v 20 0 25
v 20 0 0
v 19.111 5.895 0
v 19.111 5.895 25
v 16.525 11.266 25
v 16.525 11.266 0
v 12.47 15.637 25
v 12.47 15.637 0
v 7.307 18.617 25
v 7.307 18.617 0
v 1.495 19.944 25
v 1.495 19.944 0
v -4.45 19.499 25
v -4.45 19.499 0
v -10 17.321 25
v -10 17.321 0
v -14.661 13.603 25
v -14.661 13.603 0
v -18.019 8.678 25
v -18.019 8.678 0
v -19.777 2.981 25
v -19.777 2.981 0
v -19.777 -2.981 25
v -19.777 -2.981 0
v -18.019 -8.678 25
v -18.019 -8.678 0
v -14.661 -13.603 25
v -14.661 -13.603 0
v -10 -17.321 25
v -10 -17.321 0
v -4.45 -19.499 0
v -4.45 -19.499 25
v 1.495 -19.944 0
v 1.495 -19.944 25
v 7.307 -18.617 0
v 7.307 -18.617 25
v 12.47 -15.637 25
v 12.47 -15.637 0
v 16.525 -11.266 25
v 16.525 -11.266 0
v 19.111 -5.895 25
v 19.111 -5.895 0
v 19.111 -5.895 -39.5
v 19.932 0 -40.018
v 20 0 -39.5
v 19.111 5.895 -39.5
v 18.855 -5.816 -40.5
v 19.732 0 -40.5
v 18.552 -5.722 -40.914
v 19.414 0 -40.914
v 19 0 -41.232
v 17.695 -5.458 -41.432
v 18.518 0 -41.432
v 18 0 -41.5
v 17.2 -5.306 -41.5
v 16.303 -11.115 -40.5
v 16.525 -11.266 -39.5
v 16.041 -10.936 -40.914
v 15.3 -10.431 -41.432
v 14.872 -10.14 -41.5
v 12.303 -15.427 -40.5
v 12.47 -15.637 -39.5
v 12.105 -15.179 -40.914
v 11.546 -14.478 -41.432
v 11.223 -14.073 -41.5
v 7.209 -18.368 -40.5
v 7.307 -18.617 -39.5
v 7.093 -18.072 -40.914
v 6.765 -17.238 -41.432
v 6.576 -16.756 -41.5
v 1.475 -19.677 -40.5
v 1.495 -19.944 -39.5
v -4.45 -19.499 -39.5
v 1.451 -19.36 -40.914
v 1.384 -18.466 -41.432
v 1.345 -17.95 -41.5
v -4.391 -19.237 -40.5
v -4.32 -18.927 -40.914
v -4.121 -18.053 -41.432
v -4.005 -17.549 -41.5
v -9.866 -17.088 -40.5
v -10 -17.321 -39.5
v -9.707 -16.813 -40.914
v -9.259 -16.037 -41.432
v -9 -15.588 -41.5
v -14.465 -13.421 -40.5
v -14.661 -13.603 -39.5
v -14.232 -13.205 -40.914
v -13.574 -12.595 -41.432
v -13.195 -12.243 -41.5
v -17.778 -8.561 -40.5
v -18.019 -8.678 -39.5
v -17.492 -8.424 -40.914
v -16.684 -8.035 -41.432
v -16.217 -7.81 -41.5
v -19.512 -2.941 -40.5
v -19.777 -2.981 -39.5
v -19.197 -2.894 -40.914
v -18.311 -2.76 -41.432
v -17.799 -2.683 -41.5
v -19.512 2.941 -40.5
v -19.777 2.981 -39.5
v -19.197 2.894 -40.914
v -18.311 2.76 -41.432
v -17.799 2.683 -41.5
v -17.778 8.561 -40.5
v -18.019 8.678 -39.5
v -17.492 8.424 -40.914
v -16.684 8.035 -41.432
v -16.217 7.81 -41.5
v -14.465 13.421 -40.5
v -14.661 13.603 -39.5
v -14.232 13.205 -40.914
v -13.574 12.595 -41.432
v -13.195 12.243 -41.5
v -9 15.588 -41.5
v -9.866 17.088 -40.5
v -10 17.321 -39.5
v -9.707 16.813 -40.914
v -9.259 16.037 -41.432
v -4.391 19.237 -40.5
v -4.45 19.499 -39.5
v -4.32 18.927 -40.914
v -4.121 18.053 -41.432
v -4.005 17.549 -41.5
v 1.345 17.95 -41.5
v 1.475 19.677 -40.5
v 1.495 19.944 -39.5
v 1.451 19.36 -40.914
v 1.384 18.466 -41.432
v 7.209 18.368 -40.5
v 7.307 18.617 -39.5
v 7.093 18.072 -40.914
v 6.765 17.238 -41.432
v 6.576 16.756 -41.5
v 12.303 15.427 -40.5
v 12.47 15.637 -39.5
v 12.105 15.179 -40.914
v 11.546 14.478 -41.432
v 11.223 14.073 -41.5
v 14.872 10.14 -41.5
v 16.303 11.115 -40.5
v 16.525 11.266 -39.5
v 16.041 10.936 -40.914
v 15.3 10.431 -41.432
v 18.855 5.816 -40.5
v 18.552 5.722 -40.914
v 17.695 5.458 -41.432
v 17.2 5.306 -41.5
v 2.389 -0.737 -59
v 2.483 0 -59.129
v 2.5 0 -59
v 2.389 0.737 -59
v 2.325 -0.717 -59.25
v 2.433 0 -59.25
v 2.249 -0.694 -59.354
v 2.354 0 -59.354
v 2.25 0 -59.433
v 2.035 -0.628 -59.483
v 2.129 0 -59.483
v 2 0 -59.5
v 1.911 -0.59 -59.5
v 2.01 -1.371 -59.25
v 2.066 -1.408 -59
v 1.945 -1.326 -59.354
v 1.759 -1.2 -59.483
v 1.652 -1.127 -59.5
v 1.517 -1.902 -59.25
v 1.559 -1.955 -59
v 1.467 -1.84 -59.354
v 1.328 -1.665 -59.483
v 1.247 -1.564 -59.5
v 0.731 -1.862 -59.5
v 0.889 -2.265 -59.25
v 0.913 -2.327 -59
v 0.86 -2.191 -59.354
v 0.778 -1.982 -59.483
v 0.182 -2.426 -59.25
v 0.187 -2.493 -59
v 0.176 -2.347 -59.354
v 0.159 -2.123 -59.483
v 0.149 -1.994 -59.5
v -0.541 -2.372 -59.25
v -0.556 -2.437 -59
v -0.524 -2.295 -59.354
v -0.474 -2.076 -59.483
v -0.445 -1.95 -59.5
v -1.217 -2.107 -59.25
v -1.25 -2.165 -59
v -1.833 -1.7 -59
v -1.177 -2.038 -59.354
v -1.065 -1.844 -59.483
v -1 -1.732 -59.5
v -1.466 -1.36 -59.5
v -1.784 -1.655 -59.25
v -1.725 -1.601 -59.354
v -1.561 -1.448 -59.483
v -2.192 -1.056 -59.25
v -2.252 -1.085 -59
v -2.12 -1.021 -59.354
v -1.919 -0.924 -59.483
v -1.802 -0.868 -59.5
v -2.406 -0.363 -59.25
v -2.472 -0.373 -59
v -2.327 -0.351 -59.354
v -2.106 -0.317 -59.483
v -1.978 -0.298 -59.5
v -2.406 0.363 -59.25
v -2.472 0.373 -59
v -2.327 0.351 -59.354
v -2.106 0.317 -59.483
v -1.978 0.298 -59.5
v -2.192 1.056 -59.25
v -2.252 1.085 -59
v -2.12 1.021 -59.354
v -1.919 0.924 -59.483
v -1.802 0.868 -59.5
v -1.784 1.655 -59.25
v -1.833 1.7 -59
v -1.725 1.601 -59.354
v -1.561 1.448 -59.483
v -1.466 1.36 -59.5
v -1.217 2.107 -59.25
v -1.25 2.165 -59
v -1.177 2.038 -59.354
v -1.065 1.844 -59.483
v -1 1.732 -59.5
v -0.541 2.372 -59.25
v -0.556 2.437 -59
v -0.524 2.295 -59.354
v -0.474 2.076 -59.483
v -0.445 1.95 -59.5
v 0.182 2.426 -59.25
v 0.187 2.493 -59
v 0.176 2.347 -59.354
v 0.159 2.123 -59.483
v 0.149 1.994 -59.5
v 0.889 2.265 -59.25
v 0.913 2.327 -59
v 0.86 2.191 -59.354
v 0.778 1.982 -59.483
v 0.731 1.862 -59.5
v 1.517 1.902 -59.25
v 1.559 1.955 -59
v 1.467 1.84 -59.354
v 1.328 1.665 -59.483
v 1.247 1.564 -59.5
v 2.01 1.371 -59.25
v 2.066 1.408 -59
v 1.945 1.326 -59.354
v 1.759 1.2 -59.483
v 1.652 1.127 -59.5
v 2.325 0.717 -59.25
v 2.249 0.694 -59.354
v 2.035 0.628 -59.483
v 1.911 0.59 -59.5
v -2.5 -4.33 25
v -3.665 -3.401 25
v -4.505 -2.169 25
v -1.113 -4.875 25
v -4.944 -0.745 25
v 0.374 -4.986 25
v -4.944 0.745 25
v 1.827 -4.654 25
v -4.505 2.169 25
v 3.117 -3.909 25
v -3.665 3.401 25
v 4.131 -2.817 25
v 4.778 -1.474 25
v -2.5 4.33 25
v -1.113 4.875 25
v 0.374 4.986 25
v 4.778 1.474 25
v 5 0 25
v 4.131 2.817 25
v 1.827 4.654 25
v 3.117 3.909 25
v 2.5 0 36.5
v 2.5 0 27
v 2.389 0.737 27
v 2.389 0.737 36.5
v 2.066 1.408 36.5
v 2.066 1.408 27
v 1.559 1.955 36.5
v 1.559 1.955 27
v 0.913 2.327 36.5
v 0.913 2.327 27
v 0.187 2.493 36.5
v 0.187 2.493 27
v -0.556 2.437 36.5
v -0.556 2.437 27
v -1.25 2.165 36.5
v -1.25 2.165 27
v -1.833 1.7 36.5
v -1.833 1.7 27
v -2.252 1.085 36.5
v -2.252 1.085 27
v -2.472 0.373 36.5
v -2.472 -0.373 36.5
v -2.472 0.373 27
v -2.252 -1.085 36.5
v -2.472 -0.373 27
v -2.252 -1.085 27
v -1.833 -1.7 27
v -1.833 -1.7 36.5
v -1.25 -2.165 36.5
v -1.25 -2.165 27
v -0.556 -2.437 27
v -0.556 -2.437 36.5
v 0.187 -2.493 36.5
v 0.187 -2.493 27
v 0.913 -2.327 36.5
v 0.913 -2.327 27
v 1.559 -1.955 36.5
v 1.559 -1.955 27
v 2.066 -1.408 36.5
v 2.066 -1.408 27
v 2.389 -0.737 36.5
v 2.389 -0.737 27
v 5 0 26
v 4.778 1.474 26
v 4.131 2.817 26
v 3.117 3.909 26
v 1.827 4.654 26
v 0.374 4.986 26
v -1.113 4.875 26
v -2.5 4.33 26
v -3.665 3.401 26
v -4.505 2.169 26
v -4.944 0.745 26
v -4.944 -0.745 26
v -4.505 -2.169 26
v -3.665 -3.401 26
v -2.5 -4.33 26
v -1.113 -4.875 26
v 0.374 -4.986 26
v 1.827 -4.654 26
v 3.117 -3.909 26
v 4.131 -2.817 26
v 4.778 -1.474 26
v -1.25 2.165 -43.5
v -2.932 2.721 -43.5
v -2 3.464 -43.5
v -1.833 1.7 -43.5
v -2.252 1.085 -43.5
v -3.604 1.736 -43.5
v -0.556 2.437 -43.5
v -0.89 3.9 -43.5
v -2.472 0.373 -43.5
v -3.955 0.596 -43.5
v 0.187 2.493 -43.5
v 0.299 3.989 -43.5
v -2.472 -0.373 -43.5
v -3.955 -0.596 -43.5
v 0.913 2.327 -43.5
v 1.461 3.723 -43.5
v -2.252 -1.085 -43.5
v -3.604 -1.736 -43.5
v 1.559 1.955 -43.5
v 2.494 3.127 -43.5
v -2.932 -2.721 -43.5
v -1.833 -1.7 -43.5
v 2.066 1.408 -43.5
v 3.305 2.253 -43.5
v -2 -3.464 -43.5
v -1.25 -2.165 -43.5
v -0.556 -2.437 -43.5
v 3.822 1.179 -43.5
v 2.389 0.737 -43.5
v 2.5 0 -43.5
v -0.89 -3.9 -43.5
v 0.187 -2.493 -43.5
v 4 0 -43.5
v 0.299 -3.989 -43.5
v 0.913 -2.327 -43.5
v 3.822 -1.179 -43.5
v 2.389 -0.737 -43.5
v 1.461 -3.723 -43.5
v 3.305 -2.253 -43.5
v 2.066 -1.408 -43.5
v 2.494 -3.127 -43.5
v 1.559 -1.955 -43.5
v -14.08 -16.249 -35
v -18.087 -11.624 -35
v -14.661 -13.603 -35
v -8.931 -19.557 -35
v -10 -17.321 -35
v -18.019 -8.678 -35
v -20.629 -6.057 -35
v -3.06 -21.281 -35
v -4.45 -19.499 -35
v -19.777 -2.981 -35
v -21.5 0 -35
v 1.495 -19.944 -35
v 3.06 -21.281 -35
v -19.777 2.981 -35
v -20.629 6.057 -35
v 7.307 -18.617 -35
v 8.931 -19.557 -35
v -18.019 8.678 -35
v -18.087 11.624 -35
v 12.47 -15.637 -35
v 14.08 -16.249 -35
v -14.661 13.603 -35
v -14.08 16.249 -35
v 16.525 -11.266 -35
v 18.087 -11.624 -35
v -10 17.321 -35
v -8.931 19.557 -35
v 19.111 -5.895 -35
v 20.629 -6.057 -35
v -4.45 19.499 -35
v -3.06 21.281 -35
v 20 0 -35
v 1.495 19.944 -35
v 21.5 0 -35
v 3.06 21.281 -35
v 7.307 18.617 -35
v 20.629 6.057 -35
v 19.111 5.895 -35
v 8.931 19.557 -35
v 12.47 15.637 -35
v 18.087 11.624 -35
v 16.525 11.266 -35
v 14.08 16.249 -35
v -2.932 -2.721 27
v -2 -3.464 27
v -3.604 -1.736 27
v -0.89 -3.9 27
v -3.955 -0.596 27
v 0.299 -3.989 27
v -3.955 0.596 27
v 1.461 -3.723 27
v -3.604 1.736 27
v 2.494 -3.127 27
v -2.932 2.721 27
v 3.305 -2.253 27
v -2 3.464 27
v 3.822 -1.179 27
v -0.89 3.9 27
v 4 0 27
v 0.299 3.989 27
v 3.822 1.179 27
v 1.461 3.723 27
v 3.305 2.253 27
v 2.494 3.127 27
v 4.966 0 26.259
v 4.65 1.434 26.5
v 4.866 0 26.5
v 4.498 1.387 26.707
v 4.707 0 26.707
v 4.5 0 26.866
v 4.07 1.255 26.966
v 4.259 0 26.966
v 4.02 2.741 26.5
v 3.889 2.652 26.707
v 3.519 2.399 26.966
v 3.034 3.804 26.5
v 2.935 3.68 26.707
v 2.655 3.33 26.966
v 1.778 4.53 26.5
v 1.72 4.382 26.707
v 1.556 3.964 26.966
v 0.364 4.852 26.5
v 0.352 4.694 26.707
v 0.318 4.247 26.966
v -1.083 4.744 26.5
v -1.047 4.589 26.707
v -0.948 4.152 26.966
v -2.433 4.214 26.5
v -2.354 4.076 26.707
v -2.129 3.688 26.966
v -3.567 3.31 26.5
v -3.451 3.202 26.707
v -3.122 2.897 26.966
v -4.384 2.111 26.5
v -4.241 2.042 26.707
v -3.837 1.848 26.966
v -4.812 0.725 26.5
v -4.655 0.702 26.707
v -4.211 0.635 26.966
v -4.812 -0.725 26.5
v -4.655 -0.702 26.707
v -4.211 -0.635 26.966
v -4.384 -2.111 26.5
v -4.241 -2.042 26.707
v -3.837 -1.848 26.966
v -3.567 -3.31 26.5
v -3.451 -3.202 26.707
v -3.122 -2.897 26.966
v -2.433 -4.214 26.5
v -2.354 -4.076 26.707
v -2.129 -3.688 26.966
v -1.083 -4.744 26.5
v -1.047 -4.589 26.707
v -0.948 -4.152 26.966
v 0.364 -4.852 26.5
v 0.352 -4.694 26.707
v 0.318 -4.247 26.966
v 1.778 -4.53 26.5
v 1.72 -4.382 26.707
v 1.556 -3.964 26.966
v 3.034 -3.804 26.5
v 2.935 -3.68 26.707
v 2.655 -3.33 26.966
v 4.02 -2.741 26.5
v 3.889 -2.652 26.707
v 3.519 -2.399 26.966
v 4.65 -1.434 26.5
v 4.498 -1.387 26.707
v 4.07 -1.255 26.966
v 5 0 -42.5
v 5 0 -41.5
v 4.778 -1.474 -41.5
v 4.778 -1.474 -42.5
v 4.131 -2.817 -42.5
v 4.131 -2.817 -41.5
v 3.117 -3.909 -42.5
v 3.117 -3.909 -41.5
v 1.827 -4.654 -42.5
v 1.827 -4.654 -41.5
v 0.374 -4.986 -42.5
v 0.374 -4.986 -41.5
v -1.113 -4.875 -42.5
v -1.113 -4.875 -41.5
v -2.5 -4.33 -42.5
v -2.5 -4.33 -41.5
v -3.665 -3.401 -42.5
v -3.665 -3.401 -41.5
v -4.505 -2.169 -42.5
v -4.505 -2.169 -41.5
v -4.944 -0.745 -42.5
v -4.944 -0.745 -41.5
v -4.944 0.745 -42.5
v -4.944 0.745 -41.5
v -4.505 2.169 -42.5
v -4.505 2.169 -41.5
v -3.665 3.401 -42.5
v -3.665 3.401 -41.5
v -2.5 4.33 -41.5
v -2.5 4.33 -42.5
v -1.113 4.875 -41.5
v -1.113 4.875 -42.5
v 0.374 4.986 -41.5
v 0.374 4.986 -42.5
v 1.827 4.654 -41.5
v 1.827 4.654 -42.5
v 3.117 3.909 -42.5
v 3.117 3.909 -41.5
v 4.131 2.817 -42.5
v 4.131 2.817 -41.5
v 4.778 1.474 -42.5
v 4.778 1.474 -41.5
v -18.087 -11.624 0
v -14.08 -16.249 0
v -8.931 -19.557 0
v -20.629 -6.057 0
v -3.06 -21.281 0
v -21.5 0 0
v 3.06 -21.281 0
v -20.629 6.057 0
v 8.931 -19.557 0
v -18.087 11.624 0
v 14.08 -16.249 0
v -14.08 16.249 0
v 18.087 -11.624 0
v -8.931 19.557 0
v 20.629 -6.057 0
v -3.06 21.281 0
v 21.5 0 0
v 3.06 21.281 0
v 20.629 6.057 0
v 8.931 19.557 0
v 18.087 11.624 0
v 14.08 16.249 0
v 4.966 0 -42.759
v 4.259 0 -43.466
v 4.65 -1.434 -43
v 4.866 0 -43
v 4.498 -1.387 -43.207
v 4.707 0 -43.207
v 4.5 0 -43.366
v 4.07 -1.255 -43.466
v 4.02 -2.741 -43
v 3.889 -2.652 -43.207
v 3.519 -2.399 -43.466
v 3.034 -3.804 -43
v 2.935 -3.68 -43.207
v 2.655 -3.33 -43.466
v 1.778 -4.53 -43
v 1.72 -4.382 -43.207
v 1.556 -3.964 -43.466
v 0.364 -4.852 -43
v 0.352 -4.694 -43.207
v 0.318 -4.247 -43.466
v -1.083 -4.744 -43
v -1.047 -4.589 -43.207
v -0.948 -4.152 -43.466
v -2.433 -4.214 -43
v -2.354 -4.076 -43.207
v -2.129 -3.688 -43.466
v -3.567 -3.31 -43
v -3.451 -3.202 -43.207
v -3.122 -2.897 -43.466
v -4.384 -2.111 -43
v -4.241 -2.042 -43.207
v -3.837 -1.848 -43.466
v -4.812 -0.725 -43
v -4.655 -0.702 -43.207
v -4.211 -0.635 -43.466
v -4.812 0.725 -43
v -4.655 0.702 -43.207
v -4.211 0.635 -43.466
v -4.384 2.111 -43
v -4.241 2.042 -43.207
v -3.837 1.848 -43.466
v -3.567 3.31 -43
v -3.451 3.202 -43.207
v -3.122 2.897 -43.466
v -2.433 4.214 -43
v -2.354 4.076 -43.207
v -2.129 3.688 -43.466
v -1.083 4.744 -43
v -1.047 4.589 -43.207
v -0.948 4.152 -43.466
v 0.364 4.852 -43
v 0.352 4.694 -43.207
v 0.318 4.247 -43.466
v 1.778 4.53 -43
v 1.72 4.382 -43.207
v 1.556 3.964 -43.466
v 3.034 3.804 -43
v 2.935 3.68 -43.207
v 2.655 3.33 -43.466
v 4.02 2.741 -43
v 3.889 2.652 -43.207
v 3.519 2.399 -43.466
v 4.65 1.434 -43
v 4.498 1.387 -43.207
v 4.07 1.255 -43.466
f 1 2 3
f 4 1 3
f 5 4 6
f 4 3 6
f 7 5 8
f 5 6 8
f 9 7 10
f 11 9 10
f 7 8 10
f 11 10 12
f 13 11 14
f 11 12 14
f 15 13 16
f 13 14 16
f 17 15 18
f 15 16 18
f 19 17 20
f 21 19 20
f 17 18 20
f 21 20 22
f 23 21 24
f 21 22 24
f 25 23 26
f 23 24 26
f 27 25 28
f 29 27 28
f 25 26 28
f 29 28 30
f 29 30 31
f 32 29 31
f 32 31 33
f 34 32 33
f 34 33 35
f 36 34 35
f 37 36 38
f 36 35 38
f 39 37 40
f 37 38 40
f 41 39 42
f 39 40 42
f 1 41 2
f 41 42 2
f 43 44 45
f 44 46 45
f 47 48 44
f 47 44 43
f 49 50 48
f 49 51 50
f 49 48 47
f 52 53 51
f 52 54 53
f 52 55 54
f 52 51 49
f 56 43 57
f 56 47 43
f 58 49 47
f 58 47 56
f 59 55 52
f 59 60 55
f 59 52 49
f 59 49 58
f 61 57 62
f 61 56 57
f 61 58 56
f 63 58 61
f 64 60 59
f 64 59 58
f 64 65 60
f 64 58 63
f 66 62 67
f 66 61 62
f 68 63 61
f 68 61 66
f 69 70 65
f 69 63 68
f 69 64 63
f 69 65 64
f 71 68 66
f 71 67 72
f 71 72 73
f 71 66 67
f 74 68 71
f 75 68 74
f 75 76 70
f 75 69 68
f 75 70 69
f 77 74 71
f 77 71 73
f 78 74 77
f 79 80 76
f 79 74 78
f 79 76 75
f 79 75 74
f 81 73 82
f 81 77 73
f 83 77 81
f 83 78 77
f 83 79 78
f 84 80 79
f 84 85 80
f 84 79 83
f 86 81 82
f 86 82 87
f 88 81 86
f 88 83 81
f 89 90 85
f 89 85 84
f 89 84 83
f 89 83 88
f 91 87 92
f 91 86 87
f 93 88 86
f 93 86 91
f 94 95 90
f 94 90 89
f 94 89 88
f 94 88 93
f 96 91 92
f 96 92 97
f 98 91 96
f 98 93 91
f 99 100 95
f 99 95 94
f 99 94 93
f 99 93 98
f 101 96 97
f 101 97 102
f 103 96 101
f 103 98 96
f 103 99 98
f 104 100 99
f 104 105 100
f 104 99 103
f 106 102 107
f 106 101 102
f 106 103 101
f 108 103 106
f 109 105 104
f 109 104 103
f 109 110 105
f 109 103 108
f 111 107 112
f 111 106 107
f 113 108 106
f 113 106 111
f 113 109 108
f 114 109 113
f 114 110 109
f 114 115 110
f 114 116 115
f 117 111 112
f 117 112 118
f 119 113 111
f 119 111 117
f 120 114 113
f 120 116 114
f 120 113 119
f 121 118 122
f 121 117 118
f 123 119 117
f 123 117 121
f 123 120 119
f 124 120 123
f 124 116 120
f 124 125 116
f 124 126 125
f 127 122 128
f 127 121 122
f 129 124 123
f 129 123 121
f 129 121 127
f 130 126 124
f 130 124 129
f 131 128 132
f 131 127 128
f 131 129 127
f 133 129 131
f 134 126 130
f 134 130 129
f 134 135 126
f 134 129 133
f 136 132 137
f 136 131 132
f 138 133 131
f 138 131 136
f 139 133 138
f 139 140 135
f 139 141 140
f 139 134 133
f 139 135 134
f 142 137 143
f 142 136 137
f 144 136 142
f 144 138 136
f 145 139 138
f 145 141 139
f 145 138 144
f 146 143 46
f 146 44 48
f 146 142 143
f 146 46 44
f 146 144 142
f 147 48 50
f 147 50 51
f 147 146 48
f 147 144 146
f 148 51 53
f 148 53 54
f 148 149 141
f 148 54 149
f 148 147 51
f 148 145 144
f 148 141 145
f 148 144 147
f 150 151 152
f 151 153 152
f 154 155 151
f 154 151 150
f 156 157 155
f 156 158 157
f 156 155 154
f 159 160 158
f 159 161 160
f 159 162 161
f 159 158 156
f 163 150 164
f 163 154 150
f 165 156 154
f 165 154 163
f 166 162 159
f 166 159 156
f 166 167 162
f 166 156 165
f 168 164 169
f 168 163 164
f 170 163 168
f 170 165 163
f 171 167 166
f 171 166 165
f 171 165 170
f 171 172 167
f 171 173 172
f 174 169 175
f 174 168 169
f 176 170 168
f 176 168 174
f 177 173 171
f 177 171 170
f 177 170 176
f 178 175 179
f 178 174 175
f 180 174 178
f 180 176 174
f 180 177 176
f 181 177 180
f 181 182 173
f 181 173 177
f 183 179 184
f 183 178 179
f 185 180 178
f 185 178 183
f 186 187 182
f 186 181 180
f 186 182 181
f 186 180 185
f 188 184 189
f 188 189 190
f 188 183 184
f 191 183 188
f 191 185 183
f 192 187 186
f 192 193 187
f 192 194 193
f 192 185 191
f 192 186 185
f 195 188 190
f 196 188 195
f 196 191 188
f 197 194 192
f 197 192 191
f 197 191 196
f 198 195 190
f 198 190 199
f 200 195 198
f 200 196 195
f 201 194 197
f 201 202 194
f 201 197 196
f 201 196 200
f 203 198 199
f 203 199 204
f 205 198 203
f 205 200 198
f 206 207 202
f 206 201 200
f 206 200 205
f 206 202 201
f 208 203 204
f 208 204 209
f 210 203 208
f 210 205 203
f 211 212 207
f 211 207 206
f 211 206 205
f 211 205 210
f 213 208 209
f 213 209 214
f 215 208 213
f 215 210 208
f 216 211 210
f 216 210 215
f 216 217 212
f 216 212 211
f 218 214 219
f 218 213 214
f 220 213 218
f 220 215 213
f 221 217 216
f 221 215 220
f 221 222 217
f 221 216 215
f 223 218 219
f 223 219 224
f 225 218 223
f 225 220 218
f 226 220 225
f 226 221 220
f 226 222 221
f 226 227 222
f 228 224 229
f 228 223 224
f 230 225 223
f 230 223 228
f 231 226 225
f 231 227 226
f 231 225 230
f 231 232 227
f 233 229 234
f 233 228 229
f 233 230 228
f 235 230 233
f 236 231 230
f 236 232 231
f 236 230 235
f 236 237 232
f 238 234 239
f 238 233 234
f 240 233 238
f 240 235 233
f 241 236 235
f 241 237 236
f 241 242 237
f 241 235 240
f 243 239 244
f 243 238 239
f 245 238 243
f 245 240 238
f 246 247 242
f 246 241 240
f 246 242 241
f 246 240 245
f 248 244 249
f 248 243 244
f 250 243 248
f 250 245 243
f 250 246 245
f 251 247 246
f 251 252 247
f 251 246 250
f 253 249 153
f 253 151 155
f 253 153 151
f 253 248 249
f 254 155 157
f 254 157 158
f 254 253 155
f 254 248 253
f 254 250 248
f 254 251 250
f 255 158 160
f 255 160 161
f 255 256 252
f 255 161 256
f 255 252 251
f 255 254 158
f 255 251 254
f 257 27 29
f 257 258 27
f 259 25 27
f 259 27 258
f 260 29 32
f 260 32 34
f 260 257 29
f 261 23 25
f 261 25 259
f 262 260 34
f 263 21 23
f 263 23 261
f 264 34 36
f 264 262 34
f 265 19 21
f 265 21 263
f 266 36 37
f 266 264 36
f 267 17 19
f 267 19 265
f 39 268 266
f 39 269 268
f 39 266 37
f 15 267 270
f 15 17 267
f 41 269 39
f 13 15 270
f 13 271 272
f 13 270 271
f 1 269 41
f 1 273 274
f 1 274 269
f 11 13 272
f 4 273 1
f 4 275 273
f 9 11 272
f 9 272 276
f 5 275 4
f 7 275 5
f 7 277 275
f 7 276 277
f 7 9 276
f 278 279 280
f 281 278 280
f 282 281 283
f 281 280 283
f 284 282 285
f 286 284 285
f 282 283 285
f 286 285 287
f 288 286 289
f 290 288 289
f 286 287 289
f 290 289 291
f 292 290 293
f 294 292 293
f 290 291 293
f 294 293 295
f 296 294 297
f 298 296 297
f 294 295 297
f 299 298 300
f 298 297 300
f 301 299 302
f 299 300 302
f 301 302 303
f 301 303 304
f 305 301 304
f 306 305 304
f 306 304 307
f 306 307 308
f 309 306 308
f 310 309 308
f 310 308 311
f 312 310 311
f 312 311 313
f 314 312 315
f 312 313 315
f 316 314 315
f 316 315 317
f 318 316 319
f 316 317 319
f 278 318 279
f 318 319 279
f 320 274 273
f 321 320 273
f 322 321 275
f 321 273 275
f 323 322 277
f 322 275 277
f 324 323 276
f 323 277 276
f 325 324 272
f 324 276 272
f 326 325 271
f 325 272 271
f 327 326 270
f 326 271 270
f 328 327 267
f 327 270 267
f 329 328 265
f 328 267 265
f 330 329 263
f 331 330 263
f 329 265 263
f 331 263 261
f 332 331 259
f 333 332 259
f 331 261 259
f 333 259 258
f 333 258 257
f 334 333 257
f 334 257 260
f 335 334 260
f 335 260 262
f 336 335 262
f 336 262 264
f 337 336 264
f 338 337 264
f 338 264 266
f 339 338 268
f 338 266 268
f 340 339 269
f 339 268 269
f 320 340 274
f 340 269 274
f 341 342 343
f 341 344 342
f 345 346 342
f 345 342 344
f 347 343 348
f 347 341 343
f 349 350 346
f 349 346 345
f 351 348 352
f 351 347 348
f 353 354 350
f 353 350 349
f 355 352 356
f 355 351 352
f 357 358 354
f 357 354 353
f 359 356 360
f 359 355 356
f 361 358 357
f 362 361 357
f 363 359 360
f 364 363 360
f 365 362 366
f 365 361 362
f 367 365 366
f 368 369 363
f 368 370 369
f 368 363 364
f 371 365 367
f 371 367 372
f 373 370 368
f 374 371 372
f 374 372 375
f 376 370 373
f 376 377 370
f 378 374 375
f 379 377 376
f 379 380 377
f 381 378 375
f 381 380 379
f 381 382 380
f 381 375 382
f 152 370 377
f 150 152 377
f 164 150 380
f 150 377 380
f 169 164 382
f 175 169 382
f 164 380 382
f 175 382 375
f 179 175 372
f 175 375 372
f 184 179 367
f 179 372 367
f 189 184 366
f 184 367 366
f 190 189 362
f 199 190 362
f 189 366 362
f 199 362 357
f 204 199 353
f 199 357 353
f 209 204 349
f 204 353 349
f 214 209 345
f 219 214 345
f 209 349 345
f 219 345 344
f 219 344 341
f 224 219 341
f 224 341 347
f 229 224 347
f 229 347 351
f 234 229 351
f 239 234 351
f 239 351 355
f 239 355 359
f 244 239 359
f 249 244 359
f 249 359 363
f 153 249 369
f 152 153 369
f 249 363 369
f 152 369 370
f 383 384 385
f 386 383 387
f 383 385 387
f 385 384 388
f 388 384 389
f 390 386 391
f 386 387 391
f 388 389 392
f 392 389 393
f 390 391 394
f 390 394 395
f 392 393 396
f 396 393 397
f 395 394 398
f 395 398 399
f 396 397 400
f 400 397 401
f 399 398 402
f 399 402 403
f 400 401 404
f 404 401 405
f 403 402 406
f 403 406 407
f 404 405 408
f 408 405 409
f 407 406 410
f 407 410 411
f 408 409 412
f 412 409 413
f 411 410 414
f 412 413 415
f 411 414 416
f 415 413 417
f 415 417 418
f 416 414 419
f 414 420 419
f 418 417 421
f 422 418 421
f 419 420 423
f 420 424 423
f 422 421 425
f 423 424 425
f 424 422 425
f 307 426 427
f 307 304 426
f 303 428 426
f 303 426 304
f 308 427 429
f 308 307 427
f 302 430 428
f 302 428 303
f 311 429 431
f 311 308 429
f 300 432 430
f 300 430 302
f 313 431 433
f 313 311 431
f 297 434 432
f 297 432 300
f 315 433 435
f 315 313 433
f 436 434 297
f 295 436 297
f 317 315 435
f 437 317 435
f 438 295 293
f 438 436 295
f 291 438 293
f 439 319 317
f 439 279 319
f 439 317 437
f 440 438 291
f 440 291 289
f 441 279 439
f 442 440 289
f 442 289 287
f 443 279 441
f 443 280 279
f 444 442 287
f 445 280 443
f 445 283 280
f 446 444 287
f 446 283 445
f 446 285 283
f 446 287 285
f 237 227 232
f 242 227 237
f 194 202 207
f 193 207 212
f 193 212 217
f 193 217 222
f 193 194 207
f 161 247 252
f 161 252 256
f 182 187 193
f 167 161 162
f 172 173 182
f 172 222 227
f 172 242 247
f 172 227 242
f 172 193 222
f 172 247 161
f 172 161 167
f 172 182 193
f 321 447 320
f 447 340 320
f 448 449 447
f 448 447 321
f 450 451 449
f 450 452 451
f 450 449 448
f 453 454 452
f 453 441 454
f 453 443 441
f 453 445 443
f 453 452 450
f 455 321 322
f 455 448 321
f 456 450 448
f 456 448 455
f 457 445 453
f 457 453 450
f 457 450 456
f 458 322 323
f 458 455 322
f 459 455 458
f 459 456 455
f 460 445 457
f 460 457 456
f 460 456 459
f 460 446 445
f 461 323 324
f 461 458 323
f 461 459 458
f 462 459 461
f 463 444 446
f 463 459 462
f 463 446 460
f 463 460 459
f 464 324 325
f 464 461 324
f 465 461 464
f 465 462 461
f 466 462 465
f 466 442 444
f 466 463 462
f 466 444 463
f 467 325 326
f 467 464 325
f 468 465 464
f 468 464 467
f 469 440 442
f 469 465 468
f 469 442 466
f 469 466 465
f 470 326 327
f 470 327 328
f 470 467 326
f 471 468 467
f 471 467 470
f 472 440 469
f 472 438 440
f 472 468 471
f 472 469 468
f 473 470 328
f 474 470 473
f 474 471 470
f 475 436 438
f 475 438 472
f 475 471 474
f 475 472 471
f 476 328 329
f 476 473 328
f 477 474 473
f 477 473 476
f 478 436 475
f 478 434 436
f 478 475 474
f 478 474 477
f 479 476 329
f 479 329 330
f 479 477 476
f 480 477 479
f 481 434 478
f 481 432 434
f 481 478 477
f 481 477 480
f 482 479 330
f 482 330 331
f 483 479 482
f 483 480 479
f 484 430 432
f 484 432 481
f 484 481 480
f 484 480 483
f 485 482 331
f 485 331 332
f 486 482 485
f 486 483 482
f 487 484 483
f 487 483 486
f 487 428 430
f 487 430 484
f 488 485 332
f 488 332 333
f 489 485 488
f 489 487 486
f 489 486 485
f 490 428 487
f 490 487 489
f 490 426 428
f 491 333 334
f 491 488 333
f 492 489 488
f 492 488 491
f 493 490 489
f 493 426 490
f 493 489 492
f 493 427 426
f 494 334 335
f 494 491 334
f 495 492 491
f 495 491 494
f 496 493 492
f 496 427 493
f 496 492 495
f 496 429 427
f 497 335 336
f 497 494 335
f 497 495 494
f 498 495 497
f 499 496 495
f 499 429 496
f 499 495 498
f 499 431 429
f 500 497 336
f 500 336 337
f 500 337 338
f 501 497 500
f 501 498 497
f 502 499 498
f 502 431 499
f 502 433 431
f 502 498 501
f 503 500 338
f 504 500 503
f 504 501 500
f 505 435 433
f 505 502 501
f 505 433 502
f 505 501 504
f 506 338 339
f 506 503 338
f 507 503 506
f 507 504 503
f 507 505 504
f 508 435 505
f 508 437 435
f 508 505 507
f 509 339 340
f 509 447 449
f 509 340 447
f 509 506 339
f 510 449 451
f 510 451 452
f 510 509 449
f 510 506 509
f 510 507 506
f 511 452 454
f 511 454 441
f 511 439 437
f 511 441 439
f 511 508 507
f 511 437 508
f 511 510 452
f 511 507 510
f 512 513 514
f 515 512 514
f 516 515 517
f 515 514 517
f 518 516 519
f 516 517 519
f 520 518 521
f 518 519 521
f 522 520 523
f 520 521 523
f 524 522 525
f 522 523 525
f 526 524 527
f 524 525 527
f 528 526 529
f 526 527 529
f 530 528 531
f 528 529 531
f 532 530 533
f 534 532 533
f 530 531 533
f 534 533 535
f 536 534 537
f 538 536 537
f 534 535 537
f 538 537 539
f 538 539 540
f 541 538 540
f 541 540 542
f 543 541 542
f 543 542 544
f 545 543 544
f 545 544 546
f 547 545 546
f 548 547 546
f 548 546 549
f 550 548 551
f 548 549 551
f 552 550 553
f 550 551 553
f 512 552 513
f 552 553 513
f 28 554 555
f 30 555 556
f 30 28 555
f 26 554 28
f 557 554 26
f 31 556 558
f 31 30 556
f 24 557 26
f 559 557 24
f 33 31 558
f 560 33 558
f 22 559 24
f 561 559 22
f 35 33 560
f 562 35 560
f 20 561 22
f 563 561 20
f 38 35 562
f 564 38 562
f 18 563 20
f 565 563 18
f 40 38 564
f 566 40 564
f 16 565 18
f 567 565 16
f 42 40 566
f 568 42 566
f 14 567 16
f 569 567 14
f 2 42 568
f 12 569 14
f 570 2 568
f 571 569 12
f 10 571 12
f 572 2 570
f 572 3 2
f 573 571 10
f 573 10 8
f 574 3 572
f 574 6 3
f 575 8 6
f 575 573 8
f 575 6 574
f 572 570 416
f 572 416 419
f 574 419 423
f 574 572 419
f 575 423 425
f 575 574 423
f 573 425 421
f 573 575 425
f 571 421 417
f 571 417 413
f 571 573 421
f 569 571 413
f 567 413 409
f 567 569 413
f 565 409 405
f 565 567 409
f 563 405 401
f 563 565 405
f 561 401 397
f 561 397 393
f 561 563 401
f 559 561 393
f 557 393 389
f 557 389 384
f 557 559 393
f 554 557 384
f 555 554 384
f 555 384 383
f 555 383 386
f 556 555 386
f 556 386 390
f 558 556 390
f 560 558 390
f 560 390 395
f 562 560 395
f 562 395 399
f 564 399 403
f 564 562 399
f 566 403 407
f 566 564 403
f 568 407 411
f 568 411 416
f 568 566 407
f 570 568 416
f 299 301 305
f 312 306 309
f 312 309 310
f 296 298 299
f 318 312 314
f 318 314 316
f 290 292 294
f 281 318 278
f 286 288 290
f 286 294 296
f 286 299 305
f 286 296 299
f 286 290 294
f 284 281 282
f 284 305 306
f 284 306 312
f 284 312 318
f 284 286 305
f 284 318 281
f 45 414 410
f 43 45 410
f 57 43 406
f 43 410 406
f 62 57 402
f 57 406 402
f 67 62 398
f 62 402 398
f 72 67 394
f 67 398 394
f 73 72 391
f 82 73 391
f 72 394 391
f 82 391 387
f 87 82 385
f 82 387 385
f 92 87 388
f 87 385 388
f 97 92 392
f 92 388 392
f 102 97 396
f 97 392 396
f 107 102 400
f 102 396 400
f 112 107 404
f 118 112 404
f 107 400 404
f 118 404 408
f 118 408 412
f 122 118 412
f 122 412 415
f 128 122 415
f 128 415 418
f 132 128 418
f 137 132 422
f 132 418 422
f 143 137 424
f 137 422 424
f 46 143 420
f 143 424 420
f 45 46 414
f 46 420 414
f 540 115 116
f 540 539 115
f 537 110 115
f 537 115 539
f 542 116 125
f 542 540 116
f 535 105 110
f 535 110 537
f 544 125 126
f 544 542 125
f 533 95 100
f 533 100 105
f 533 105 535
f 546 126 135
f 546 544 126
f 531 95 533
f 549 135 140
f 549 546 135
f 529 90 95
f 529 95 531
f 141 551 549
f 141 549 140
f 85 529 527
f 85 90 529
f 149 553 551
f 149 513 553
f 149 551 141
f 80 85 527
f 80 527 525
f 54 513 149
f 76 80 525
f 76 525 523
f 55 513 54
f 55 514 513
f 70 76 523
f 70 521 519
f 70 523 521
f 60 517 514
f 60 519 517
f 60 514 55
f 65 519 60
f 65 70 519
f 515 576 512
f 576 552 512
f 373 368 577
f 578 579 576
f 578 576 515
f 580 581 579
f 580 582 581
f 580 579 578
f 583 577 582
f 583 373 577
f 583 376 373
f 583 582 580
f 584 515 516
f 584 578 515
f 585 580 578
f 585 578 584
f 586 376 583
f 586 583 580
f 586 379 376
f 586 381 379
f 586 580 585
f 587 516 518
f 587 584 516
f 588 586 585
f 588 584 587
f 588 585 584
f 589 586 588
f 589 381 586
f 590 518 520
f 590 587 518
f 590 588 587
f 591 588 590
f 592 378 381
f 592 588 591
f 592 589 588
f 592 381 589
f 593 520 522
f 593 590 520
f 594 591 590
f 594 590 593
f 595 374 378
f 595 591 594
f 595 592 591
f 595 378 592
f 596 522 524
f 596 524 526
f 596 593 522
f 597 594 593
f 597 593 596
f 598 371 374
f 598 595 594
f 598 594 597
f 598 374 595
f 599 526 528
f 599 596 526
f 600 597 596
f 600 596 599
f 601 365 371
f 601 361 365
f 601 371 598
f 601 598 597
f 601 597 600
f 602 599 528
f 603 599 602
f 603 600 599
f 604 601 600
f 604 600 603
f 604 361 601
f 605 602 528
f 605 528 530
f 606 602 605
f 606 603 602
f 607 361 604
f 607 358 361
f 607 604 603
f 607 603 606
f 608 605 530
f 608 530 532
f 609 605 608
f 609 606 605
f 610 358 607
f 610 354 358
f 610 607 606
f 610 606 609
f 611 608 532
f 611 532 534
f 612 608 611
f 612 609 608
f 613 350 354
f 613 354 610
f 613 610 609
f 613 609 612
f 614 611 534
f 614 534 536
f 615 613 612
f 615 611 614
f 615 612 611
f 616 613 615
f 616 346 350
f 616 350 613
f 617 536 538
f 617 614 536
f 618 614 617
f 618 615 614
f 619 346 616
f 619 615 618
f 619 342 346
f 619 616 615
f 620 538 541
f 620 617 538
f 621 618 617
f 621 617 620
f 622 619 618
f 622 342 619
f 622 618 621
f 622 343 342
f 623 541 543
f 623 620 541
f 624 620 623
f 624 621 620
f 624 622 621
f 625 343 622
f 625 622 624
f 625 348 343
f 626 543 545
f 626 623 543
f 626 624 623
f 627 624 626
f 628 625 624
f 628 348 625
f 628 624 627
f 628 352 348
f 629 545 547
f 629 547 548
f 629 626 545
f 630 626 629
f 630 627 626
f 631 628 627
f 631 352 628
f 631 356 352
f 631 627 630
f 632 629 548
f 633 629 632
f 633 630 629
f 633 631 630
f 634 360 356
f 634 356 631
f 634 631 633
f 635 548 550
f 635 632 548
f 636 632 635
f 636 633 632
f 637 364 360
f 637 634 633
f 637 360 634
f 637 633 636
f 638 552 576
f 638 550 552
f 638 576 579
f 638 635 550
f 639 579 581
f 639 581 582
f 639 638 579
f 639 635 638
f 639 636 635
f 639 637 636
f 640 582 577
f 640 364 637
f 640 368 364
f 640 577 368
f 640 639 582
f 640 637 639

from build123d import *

# Parameters (mm, degrees)
F0_R      = 21.5
F1_DEPTH  = 35
F2_R      = 20
F3_DEPTH  = 25
F4_R      = 5
F5_DEPTH  = 2
F6_R      = 20
F7_DEPTH  = 6.5
F8_R      = 2
F9_R      = 5
F10_DEPTH = 2
F11_R     = 1
F12_R     = 2.5
F13_DEPTH = 16
F14_R     = 0.5
F15_R     = 1
F16_R     = 2.5
F17_DEPTH = 9.5


with BuildPart() as f1:
    # F0 (on Top) → F1 (new body)
    with BuildSketch(Plane.XY):
        Circle(F0_R)
    extrude(amount=-F1_DEPTH)

    # F2 (on face) → F3 (join)
    with BuildSketch(Plane.XY):
        Circle(F2_R)
    extrude(amount=F3_DEPTH)

    # F4 (on face) → F5 (join)
    with BuildSketch(Plane.XY.offset(25)):
        Circle(F4_R)
    extrude(amount=F5_DEPTH)

    # F6 (on face) → F7 (join)
    with BuildSketch(Plane(origin=(0, 0, -35), x_dir=(1, 0, 0), z_dir=(0, 0, -1))):
        Circle(F6_R)
    extrude(amount=F7_DEPTH)

    # F8
    f8_edges = [f1.edges().sort_by_distance(p)[0] for p in [
        (-20, 0, -41.5),
    ]]
    fillet(f8_edges, radius=F8_R)

    # F9 (on face) → F10 (join)
    with BuildSketch(Plane(origin=(0, 0, -41.5), x_dir=(1, 0, 0), z_dir=(0, 0, -1))):
        Circle(F9_R)
    extrude(amount=F10_DEPTH)

    # F11
    f11_edges = [f1.edges().sort_by_distance(p)[0] for p in [
        (-5, 0, -43.5),
    ]]
    fillet(f11_edges, radius=F11_R)

    # F12 (on face) → F13 (join)
    with BuildSketch(Plane(origin=(0, 0, -43.5), x_dir=(1, 0, 0), z_dir=(0, 0, -1))):
        Circle(F12_R)
    extrude(amount=F13_DEPTH)

    # F14
    f14_edges = [f1.edges().sort_by_distance(p)[0] for p in [
        (-2.5, 0, -59.5),
    ]]
    fillet(f14_edges, radius=F14_R)

    # F15
    f15_edges = [f1.edges().sort_by_distance(p)[0] for p in [
        (-5, 0, 27),
    ]]
    fillet(f15_edges, radius=F15_R)

    # F16 (on face) → F17 (join)
    with BuildSketch(Plane.XY.offset(27)):
        Circle(F16_R)
    extrude(amount=F17_DEPTH)


solid = f1.part
